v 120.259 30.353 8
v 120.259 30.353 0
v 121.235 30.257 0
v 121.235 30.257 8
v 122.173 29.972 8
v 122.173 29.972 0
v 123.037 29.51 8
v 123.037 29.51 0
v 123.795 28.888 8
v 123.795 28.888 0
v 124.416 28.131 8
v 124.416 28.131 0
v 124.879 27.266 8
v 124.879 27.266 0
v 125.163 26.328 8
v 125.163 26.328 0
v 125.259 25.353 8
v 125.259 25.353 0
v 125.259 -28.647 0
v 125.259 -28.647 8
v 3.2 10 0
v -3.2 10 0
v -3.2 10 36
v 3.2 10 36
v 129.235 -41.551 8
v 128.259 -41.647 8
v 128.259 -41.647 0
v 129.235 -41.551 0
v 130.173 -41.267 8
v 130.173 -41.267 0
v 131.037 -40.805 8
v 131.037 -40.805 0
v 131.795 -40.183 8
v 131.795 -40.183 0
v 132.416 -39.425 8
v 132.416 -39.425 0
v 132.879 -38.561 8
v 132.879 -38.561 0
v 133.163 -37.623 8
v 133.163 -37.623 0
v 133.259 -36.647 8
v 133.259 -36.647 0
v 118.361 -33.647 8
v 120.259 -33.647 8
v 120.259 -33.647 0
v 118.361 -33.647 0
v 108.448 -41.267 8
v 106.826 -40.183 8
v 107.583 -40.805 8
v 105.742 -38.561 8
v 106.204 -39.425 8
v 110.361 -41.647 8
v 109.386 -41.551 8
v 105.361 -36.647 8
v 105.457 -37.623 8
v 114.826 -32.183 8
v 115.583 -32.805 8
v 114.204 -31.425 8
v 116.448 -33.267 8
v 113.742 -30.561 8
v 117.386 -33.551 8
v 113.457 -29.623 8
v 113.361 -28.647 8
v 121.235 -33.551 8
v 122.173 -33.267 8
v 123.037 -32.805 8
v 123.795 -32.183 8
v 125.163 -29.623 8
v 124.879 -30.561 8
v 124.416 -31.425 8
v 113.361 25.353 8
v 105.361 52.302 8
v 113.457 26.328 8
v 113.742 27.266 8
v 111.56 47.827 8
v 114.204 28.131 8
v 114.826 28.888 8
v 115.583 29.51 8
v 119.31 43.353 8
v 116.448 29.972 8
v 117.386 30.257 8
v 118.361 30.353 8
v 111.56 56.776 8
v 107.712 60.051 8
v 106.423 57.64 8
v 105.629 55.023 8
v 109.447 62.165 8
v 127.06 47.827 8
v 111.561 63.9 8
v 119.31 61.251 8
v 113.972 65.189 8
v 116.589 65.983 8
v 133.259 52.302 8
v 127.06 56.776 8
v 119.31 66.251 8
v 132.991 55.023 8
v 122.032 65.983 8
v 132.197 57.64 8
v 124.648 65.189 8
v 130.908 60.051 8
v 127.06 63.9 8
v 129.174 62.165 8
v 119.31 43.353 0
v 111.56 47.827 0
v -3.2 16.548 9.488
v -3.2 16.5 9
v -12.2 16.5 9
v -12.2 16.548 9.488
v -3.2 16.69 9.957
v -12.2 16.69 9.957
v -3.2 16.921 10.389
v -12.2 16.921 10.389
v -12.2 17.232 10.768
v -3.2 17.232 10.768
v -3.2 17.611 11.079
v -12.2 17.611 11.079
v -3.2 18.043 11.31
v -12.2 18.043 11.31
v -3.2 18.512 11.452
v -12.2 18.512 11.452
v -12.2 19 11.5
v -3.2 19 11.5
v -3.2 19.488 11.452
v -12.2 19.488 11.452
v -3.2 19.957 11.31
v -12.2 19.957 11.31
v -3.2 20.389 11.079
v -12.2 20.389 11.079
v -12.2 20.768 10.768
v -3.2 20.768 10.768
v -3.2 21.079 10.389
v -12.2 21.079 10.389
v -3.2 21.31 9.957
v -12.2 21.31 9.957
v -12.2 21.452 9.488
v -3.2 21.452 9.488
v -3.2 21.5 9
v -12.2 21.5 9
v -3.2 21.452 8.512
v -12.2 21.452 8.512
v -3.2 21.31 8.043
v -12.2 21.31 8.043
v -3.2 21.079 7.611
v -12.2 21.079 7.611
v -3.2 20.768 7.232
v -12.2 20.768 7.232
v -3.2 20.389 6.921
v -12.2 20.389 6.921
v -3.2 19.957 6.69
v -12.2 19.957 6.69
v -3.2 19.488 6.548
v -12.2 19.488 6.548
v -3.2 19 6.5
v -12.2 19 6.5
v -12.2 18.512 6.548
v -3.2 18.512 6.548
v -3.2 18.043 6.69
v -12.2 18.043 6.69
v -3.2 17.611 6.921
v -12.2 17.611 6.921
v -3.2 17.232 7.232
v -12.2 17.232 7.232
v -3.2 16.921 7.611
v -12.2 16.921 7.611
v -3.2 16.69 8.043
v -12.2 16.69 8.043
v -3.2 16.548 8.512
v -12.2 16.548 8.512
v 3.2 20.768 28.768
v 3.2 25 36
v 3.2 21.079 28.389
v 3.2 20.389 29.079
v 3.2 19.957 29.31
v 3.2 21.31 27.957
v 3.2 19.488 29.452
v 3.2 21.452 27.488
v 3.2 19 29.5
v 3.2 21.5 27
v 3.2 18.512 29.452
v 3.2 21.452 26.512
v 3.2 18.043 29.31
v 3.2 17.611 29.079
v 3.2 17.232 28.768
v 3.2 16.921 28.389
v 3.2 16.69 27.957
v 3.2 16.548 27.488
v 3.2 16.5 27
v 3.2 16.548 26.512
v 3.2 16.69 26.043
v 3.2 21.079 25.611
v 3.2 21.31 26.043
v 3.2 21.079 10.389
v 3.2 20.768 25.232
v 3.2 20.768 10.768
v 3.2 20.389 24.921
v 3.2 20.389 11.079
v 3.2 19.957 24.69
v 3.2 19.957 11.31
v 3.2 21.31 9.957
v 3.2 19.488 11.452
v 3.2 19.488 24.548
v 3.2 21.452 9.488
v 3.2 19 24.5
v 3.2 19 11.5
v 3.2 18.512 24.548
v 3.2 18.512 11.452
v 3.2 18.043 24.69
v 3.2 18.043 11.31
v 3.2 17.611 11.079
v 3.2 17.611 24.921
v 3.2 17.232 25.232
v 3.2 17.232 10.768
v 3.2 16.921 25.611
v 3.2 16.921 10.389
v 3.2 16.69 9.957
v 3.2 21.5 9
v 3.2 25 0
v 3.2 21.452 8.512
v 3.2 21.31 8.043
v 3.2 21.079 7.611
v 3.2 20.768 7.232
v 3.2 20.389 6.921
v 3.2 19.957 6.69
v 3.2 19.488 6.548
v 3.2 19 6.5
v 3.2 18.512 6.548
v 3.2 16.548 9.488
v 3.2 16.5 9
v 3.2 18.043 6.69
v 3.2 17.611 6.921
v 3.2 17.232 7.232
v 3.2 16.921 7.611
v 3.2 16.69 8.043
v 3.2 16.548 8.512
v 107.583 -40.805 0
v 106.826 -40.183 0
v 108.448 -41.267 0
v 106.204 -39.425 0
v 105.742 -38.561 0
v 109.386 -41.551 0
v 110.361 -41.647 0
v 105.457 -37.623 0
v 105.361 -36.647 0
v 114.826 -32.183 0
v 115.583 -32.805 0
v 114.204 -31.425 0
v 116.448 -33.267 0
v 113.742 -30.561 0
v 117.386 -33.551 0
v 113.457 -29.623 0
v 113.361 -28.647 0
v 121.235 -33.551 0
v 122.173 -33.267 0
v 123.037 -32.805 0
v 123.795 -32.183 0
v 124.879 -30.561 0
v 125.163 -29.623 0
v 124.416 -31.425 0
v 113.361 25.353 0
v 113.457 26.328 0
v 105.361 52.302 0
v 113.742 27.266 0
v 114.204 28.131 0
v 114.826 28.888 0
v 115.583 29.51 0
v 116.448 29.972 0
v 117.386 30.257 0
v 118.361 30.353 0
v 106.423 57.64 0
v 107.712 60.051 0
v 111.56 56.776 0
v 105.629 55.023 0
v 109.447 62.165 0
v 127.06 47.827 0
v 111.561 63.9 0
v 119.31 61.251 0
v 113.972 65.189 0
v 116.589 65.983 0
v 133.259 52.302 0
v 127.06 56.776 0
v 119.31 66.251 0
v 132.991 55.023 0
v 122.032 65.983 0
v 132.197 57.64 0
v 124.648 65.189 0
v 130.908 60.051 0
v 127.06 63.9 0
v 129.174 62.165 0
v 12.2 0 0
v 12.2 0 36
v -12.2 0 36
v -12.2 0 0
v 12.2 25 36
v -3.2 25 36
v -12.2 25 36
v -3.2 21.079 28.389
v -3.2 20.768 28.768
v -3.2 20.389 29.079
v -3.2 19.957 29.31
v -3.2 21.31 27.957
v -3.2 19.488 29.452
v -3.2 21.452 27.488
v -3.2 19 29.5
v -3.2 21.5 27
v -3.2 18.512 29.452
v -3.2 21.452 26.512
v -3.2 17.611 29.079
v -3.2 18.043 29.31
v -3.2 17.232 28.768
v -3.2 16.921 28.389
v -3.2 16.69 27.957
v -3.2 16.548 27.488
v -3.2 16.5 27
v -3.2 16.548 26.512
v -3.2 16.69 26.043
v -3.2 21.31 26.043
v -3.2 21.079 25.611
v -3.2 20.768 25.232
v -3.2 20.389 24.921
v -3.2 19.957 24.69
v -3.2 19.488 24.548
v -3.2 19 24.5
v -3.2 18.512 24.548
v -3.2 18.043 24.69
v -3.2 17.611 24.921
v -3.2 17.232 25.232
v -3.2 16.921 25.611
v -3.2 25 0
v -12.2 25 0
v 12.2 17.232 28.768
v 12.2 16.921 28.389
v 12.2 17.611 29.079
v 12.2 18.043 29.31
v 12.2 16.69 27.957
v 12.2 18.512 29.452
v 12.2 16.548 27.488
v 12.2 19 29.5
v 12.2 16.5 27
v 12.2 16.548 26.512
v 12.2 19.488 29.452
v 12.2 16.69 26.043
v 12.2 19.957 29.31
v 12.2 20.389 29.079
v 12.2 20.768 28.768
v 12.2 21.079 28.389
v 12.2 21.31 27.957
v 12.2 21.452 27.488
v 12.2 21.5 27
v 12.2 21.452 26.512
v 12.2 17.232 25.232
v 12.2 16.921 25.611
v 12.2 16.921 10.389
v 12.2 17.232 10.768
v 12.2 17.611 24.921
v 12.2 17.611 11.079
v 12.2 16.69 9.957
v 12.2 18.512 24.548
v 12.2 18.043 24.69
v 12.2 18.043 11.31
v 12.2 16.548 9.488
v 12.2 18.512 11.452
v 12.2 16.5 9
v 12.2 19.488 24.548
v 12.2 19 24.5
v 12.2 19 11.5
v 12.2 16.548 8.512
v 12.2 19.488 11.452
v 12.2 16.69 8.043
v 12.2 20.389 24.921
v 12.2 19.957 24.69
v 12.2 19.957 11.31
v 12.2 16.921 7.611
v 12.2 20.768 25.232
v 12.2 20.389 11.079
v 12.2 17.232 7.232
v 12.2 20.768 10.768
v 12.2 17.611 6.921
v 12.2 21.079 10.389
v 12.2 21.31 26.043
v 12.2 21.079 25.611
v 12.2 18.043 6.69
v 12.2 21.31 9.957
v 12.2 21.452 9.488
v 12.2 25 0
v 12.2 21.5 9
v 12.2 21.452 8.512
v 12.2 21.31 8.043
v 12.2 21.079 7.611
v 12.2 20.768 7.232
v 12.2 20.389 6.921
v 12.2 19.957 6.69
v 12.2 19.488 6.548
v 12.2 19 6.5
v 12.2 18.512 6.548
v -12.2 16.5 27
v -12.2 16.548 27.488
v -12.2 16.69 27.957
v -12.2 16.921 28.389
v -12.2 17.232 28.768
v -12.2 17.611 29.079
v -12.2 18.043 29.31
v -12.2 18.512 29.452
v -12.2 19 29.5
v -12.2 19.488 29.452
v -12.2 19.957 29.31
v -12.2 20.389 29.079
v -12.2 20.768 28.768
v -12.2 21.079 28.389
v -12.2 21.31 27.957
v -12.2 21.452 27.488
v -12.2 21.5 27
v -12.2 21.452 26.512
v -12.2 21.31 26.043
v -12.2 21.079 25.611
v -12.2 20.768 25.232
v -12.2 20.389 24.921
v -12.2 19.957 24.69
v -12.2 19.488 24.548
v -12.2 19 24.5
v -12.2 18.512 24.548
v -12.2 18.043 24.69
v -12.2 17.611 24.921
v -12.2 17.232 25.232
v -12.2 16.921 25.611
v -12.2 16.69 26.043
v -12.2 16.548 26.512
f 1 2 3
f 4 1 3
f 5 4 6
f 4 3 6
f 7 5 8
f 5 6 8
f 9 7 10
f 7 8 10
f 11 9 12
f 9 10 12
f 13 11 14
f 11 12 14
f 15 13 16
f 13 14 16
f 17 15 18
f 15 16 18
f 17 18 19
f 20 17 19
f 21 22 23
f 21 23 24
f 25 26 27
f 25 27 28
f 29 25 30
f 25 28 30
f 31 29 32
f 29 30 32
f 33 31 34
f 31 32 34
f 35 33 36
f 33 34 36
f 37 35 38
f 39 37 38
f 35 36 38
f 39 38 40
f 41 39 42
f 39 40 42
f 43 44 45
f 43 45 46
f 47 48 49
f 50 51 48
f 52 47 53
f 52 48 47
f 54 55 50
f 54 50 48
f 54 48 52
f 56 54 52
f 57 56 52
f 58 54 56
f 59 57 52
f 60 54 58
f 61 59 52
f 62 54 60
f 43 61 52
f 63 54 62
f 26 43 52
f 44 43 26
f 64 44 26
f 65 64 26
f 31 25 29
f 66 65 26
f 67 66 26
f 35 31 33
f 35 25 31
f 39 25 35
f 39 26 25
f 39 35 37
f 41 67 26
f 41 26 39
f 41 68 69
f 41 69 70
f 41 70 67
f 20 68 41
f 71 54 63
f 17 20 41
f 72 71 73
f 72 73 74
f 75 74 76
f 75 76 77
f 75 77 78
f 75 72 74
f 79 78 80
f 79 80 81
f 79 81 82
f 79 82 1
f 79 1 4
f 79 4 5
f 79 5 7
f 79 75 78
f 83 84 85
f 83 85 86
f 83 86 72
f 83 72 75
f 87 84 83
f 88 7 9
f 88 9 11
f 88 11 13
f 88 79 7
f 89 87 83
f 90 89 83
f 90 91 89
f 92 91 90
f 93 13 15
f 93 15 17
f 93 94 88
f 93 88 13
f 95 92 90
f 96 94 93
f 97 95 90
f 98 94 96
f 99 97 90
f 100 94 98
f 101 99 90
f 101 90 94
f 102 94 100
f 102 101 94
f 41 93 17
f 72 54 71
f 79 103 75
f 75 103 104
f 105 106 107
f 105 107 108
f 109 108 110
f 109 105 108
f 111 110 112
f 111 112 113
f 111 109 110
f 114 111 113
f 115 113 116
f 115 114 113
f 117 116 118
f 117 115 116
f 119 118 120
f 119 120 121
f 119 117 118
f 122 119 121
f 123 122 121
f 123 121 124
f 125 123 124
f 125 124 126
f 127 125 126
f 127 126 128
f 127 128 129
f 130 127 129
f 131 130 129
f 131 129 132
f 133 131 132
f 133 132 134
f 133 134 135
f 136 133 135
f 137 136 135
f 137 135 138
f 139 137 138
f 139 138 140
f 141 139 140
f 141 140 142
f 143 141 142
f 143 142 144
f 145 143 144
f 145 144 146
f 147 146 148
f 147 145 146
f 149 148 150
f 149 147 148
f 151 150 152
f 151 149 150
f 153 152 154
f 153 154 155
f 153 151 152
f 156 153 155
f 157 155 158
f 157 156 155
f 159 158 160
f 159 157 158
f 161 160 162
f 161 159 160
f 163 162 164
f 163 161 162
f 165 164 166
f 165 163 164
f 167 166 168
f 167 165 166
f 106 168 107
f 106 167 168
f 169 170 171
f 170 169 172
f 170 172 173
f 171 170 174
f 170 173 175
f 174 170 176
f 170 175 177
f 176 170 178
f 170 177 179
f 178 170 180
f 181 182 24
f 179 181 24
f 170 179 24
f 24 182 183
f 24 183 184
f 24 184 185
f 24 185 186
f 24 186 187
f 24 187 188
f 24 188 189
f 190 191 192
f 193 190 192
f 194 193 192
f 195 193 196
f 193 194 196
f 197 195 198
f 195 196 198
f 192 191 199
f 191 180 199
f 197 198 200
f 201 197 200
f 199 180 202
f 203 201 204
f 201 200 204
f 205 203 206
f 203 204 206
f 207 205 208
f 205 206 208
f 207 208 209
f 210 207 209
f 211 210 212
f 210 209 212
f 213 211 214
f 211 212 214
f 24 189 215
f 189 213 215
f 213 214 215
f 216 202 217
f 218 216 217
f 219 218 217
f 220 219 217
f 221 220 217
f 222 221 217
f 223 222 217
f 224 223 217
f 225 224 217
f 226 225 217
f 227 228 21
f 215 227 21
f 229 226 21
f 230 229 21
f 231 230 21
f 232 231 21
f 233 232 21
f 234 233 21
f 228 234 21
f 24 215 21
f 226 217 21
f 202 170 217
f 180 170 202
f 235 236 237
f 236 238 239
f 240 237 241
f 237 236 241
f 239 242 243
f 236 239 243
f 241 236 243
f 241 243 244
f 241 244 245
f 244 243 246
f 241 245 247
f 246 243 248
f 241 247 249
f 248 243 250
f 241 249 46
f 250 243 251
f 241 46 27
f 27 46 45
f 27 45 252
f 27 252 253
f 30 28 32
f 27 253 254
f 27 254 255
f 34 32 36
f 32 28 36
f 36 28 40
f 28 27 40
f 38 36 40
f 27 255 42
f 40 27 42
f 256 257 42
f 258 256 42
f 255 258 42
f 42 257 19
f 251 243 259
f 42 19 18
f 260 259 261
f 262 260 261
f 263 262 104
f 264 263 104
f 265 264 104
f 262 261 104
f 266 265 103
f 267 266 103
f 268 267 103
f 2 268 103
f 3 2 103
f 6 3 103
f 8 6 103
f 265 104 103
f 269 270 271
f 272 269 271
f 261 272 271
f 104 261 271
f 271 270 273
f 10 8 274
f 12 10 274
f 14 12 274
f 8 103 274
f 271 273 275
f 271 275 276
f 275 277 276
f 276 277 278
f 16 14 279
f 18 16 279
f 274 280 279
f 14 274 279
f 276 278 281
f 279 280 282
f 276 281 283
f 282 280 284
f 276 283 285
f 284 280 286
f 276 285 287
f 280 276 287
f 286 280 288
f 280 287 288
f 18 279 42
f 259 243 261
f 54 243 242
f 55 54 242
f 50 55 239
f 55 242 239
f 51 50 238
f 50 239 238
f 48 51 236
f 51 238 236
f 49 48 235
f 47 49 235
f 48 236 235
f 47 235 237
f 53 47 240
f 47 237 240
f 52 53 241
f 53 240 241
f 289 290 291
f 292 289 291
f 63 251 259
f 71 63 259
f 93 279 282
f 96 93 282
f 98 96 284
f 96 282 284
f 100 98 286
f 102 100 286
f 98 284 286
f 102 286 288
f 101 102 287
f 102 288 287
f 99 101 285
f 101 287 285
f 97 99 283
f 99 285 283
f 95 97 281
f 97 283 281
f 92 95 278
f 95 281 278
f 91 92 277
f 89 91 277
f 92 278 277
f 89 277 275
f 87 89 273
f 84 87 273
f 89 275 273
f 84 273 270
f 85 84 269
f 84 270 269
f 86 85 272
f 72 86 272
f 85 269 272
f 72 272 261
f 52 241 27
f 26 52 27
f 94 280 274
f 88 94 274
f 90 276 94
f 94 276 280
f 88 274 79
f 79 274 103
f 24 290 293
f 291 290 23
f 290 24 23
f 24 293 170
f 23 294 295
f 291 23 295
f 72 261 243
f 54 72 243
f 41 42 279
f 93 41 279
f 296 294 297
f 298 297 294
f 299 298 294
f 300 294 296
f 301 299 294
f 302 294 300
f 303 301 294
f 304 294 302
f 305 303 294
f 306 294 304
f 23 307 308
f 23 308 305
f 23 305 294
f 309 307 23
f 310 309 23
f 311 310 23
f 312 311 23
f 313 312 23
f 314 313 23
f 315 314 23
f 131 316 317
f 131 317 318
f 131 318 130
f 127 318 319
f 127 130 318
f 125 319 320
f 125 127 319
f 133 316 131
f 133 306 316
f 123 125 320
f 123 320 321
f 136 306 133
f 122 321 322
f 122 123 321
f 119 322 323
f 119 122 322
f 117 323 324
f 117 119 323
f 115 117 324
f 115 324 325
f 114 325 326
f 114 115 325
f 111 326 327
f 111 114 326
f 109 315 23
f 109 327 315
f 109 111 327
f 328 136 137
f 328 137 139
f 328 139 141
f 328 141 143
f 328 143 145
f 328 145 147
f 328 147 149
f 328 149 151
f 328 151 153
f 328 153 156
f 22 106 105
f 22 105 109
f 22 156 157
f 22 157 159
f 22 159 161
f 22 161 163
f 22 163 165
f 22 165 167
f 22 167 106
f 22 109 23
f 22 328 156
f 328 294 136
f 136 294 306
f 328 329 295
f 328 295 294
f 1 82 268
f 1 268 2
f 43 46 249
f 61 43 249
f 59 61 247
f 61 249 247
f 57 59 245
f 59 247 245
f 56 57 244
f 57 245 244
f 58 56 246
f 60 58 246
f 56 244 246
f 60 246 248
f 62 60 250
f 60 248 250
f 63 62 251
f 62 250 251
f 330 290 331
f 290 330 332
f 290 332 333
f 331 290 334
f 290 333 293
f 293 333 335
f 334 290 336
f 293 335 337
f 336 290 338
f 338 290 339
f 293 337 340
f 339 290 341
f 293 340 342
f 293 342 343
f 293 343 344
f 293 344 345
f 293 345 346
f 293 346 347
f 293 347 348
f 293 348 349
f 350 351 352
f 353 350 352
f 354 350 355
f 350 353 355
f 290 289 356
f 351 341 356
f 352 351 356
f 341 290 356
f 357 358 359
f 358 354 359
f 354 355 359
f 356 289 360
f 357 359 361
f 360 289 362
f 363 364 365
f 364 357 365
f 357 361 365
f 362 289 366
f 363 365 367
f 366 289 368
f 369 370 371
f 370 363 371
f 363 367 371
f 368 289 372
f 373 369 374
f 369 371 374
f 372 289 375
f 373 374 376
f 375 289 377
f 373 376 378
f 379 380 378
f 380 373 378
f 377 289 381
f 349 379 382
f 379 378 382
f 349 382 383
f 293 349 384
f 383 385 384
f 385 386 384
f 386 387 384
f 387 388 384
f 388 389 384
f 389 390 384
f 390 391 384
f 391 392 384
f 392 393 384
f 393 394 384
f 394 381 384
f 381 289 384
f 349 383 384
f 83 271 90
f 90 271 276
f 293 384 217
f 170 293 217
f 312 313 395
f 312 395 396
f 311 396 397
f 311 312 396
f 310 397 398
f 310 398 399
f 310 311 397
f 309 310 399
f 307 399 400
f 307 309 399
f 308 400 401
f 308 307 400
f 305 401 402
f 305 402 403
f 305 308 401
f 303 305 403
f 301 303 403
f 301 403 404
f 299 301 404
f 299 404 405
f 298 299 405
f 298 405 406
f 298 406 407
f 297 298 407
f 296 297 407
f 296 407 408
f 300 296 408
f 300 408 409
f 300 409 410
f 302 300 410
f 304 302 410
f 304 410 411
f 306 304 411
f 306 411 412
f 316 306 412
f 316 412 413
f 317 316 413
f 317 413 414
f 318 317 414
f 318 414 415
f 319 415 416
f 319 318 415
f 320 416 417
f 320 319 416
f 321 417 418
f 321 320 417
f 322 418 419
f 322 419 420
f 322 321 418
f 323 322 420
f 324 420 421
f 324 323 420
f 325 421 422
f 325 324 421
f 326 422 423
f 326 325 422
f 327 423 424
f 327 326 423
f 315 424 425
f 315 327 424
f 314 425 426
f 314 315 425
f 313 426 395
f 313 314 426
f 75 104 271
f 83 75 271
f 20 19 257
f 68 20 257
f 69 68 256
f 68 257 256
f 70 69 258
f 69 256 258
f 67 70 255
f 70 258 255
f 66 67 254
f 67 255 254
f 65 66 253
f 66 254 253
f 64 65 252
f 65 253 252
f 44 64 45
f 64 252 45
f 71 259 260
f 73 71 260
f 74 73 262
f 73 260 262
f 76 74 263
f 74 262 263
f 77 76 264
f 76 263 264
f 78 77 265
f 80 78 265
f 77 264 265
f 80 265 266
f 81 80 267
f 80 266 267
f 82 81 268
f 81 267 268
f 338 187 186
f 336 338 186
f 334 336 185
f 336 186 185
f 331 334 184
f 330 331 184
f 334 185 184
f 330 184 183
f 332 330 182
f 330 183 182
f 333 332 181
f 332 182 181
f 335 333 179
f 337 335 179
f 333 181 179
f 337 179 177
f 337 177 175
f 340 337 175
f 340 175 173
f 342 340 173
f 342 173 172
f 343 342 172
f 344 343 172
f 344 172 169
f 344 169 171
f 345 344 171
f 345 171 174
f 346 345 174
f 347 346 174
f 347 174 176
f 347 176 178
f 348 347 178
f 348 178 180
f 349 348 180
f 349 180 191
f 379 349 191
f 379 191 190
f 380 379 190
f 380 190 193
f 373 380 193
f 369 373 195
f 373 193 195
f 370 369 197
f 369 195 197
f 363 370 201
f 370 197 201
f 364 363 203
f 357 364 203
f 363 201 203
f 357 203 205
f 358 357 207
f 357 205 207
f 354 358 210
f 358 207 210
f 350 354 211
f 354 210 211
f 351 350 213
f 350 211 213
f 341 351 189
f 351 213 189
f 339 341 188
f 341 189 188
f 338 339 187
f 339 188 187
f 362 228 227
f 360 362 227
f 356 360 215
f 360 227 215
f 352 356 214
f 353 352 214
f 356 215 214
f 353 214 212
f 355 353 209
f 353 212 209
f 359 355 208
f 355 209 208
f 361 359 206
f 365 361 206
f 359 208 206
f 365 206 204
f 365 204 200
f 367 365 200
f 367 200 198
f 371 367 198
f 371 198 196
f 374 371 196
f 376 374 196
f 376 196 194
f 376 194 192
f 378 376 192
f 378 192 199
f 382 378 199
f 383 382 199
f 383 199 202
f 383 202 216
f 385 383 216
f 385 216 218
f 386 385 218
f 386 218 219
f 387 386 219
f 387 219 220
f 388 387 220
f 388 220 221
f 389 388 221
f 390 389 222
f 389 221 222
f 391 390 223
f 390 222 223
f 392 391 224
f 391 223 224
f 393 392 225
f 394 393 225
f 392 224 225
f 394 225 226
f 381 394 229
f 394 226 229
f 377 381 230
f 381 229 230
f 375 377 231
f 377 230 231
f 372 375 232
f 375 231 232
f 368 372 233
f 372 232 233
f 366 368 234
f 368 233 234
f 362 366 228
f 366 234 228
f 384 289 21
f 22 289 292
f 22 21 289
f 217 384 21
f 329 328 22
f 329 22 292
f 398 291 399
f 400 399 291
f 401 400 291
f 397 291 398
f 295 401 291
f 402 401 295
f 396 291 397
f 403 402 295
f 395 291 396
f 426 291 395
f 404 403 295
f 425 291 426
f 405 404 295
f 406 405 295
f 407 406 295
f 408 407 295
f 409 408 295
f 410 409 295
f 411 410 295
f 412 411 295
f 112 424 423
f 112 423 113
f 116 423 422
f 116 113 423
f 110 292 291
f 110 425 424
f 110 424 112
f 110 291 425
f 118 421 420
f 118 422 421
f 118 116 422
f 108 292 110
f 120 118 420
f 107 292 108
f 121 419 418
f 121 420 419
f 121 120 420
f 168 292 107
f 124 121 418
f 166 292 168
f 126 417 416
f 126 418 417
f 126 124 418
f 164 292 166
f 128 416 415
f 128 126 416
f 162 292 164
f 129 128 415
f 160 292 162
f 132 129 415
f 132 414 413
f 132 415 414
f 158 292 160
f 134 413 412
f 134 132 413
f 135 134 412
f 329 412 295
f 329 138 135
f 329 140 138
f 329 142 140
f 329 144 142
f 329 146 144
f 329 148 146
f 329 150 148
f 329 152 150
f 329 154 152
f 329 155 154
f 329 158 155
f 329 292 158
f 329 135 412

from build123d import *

# Parameters (mm, degrees)
F1_DEPTH = 36
F2_R     = 2.5
F3_DEPTH = 9.001
F6_DEPTH = 8


with BuildPart() as f1:
    # F0 (on Top) → F1 (new body)
    with BuildSketch(Plane.XY):
        Polygon((0, 10), (0, 0), (12.2, 0), (12.2, 25), (3.2, 25), (3.2, 10), align=None)
    extrude(amount=F1_DEPTH)

    # F2 (on face) → F3 (cut, through all)
    with BuildSketch(Plane(origin=(3.2, 0, 0), x_dir=(0, -1, 0), z_dir=(-1, 0, 0))):
        with Locations((-19, 27)):
            Circle(F2_R)
        with Locations((-19, 9)):
            Circle(F2_R)
    extrude(amount=-F3_DEPTH, mode=Mode.SUBTRACT)

    # F4: F1 across face


with BuildPart() as f1_1:
    add(f1.part)
    add(f1.part.mirror(Plane(origin=(0, 5, 18), x_dir=(0, -1, 0), z_dir=(-1, 0, 0))))


with BuildPart() as f6:
    # F5 (on Top) → F6 (new body)
    with BuildSketch(Plane.XY):
        with BuildLine():
            Line((133.259146, -36.647168), (133.259146, 52.301761))
            ThreePointArc((133.259146, 52.301761), (119.310217, 38.352832), (105.361288, 52.301761))
            Line((105.361288, 52.301761), (105.361288, -36.647168))
            ThreePointArc((105.361288, -36.647168), (106.825754, -40.182702), (110.361288, -41.647168))
            Line((110.361288, -41.647168), (128.259146, -41.647168))
            ThreePointArc((128.259146, -41.647168), (131.79468, -40.182702), (133.259146, -36.647168))
        make_face()
        with BuildLine():
            ThreePointArc((113.361288, 25.352832), (114.825754, 28.888366), (118.361288, 30.352832))
            Line((118.361288, 30.352832), (120.259146, 30.352832))
            ThreePointArc((120.259146, 30.352832), (123.79468, 28.888366), (125.259146, 25.352832))
            Line((125.259146, 25.352832), (125.259146, -28.647168))
            ThreePointArc((125.259146, -28.647168), (123.79468, -32.182702), (120.259146, -33.647168))
            Line((120.259146, -33.647168), (118.361288, -33.647168))
            ThreePointArc((118.361288, -33.647168), (114.825754, -32.182702), (113.361288, -28.647168))
            Line((113.361288, -28.647168), (113.361288, 25.352832))
        make_face(mode=Mode.SUBTRACT)
        with BuildLine():
            ThreePointArc((105.361288, 52.301761), (119.310217, 38.352832), (133.259146, 52.301761))
            ThreePointArc((133.259146, 52.301761), (119.310217, 66.250691), (105.361288, 52.301761))
        make_face()
        Polygon((127.060217, 56.776226), (127.060217, 47.827297), (119.310217, 43.352832), (111.560217, 47.827297), (111.560217, 56.776226), (119.310217, 61.250691), align=None, mode=Mode.SUBTRACT)
    extrude(amount=F6_DEPTH)


solid = Compound([f1_1.part, f6.part])
